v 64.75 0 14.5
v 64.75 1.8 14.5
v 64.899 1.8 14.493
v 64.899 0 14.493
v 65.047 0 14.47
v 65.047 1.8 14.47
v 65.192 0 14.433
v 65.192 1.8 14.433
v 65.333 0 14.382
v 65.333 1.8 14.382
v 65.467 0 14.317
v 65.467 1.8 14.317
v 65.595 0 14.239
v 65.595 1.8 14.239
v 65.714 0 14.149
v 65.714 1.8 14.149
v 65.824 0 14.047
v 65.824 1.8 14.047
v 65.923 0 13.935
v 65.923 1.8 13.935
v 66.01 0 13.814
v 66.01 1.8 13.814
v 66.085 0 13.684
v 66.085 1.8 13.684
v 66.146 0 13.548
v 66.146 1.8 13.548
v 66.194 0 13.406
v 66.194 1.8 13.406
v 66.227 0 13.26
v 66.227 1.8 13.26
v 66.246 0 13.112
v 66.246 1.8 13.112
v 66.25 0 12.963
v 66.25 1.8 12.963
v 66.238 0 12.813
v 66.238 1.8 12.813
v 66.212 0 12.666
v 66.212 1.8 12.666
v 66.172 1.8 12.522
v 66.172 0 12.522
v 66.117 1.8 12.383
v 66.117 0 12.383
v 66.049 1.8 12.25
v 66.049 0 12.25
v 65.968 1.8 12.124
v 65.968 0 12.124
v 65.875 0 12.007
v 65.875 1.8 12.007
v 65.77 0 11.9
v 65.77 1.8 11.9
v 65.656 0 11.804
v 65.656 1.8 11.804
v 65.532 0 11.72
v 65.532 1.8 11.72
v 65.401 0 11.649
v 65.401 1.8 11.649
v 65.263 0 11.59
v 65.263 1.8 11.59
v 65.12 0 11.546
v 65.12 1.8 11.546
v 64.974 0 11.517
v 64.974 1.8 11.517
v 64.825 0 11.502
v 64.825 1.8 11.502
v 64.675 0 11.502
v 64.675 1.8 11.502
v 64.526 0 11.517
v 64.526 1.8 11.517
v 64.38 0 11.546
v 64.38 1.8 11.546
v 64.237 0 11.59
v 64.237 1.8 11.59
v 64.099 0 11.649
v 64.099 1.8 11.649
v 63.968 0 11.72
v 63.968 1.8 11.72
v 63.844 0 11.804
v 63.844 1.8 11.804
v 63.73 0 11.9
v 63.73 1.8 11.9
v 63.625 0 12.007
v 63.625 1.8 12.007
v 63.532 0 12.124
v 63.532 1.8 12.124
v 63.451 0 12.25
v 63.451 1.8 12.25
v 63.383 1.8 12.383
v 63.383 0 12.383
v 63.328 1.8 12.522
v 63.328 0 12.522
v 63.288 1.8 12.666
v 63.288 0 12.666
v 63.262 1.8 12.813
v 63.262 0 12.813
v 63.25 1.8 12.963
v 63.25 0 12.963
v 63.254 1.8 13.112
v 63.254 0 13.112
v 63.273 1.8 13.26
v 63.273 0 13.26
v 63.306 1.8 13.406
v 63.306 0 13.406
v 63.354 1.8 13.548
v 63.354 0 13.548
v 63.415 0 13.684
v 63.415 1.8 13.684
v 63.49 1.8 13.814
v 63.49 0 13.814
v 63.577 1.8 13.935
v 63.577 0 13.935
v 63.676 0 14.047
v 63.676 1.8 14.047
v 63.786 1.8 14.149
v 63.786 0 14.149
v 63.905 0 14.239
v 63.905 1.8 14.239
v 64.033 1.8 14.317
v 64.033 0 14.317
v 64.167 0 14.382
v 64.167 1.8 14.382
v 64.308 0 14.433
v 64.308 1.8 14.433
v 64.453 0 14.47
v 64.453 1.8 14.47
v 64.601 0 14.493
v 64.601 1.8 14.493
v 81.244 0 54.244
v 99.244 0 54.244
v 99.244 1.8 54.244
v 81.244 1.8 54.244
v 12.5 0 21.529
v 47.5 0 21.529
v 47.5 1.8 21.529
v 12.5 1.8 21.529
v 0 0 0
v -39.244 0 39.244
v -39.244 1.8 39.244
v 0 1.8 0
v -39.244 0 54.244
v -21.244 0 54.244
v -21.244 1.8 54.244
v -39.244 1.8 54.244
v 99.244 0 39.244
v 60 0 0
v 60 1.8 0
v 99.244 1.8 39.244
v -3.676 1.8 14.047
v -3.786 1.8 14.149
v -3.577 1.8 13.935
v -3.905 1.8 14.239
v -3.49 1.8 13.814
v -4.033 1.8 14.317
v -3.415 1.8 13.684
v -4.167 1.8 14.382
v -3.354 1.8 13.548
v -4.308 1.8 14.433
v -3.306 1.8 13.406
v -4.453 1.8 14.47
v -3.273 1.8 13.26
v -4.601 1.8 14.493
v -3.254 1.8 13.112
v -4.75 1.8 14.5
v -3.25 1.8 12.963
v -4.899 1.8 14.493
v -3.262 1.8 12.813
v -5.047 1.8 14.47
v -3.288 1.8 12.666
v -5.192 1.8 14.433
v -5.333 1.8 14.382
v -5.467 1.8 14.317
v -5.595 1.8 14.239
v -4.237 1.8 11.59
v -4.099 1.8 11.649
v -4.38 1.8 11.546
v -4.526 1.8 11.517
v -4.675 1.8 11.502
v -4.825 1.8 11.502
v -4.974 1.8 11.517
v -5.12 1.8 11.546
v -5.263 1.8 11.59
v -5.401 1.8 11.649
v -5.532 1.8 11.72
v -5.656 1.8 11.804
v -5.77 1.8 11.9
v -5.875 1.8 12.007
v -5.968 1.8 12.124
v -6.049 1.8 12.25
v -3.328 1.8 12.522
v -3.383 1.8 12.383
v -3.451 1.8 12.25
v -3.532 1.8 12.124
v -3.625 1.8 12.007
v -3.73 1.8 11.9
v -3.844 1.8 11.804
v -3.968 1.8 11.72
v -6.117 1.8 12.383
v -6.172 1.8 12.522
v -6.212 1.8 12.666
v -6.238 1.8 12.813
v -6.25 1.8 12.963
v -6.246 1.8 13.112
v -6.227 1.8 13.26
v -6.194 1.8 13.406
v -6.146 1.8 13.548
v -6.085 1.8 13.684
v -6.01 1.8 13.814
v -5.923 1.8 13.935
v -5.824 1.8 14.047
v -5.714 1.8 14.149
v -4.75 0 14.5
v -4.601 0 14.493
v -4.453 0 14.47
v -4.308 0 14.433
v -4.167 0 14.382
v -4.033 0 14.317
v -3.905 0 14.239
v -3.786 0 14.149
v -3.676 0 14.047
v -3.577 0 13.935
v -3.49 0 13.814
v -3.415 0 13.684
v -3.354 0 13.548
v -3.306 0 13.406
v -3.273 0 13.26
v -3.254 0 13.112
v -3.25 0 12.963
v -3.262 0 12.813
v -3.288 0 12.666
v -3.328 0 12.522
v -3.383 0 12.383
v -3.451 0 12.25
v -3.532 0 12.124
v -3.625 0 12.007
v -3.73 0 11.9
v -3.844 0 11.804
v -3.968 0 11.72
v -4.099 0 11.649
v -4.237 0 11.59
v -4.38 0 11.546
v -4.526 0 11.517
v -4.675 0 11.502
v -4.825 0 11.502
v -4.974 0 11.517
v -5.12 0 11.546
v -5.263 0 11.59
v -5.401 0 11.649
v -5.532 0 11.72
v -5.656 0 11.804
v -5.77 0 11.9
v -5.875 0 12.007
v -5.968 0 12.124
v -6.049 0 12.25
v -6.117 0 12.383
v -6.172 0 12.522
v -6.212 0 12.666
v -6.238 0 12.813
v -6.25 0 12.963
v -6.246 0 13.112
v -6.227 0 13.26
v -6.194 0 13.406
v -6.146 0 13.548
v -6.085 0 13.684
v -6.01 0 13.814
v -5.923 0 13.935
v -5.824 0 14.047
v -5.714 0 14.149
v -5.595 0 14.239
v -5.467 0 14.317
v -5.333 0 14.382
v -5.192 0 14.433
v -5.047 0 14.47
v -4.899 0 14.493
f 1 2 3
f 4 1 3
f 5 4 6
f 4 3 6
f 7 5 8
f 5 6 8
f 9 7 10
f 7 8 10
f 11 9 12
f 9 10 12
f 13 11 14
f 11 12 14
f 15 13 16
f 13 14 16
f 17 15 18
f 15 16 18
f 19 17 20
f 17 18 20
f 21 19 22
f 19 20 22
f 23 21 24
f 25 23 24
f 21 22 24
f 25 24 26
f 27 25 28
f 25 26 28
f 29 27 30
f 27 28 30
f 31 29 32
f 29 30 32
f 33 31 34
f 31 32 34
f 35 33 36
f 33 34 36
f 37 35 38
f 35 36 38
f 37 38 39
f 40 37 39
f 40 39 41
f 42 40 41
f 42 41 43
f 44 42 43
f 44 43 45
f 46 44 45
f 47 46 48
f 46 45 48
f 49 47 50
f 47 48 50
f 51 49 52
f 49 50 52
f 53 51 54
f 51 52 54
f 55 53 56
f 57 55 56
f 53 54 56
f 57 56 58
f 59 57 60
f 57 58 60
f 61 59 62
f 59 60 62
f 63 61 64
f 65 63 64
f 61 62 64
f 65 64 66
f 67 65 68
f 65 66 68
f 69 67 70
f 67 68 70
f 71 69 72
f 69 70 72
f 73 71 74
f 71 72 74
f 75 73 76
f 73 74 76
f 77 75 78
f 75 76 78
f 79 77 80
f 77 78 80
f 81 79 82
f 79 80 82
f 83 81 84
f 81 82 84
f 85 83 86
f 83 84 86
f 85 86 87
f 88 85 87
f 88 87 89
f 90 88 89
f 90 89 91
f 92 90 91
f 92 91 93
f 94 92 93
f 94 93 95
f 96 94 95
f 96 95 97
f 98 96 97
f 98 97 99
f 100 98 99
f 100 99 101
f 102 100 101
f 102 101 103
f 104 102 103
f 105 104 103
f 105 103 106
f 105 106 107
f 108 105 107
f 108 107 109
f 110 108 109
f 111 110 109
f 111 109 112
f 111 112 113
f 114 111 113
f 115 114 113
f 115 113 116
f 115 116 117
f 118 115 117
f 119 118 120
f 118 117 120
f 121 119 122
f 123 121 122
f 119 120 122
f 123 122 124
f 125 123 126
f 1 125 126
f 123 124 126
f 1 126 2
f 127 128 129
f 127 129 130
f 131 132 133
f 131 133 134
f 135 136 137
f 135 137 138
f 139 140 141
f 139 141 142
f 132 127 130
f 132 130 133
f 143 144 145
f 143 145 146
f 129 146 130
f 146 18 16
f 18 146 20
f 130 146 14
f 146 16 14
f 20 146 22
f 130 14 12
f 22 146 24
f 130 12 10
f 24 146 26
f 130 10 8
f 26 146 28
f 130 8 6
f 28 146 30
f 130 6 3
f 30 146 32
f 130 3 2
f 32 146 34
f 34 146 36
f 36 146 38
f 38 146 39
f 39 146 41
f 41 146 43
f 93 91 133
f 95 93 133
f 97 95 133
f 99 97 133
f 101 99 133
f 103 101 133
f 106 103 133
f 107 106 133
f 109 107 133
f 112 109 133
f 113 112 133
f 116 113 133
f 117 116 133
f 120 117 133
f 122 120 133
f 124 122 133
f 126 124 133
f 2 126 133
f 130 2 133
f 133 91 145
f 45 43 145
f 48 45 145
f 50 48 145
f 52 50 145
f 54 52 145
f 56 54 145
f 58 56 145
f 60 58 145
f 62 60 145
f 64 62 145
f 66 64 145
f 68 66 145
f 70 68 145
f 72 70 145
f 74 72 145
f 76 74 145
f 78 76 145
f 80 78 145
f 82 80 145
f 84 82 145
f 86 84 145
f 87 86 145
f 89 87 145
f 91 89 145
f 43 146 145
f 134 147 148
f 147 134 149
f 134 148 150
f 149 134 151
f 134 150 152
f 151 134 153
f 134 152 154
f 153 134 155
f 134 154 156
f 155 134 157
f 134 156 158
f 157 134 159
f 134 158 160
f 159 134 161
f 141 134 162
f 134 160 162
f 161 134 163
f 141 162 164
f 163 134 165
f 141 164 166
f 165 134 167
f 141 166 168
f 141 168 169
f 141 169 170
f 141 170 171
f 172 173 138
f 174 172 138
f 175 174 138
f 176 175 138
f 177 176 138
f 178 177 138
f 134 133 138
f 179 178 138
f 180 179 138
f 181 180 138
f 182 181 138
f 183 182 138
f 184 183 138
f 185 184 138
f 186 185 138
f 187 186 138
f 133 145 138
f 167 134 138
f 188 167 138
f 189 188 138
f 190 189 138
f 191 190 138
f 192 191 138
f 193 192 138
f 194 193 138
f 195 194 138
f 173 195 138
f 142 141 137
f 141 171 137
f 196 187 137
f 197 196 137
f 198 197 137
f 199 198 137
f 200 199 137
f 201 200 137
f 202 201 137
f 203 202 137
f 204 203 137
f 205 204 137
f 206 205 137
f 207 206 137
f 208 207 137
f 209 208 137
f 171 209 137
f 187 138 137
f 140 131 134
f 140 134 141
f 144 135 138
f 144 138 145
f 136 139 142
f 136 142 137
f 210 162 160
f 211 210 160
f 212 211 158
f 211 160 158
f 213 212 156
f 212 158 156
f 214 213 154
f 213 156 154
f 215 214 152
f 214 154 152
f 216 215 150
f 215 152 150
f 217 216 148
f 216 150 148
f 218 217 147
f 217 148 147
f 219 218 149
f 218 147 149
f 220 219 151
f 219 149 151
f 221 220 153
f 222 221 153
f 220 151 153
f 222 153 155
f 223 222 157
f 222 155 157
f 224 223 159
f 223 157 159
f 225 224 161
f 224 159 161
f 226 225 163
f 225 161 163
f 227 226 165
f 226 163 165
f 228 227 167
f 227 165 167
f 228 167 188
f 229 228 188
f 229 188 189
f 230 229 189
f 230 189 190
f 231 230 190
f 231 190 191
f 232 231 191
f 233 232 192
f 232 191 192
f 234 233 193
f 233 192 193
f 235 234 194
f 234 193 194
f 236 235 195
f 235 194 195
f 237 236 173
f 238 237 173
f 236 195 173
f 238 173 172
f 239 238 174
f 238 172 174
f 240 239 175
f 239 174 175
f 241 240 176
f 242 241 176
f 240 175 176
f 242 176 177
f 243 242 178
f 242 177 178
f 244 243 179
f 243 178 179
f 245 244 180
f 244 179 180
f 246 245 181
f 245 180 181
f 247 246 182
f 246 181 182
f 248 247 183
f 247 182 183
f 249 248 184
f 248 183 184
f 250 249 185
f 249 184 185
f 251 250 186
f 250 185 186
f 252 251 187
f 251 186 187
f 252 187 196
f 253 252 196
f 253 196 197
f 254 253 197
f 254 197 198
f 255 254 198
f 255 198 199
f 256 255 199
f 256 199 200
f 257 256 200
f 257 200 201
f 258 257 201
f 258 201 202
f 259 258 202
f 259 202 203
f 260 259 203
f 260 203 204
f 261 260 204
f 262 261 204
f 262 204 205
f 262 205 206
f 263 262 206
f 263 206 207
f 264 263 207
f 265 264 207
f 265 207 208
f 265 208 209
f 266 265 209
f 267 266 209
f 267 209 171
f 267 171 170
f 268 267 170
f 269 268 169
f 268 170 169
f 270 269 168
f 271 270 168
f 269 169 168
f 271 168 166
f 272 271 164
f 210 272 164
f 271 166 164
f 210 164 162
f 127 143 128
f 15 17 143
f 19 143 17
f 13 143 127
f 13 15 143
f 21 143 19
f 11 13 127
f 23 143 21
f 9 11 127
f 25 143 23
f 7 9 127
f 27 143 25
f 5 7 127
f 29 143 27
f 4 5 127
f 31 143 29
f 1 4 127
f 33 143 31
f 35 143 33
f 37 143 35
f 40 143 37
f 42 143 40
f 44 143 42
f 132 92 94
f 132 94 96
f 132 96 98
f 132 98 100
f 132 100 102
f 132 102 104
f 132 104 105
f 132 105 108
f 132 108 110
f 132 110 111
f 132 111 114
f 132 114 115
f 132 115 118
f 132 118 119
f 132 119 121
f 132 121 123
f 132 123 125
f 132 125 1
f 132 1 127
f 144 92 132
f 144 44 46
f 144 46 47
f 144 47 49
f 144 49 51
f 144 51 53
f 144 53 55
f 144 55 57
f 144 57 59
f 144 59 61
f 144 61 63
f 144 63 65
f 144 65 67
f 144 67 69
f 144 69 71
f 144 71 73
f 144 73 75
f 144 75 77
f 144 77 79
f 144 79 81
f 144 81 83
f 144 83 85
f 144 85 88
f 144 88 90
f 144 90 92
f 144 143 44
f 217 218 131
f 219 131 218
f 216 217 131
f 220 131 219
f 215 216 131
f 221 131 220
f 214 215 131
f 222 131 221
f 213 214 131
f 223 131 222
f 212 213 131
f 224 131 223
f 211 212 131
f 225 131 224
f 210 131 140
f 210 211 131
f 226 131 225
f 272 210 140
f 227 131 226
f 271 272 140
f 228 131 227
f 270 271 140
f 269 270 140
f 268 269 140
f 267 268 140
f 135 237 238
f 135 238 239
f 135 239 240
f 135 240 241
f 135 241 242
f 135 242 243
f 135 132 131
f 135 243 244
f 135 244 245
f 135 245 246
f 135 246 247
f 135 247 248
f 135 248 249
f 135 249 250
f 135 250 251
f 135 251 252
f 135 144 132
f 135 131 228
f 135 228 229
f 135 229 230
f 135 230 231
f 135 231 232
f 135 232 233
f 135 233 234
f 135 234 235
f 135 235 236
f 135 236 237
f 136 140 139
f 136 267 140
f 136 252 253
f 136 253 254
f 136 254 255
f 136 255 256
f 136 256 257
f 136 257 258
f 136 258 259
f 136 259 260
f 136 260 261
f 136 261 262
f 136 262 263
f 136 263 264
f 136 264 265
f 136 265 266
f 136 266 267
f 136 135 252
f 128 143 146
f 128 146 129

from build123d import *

# Parameters (mm, degrees)
BOSS_EXTRUDE1_DEPTH = 1.8
SKETCH2_R           = 1.5
CUT_EXTRUDE2_DEPTH  = 1.8


with BuildPart() as part:
    # Sketch1 → Boss-Extrude1 (new body)
    with BuildSketch(Plane(origin=(0, 0, 0), x_dir=(1, 0, 0), z_dir=(0, 1, 0))):
        Polygon((0, 0), (60, 0), (99.244426356, -39.244426356), (99.244426356, -54.244426356), (81.244426356, -54.244426356), (47.5, -21.528777349), (12.5, -21.528777349), (-21.244426356, -54.244426356), (-39.244426356, -54.244426356), (-39.244426356, -39.244426356), align=None)
    extrude(amount=BOSS_EXTRUDE1_DEPTH)

    # Sketch2 → Cut-Extrude2 (cut)
    with BuildSketch(Plane(origin=(0, 1.8, 0), x_dir=(1, 0, 0), z_dir=(0, 1, 0))):
        with Locations(Location((-4.75, -13, 0), (0, 0, 270))):
            Circle(SKETCH2_R)
        with Locations(Location((64.75, -13, 0), (0, 0, 270))):
            Circle(SKETCH2_R)
    extrude(amount=-CUT_EXTRUDE2_DEPTH, mode=Mode.SUBTRACT)


solid = part.part
